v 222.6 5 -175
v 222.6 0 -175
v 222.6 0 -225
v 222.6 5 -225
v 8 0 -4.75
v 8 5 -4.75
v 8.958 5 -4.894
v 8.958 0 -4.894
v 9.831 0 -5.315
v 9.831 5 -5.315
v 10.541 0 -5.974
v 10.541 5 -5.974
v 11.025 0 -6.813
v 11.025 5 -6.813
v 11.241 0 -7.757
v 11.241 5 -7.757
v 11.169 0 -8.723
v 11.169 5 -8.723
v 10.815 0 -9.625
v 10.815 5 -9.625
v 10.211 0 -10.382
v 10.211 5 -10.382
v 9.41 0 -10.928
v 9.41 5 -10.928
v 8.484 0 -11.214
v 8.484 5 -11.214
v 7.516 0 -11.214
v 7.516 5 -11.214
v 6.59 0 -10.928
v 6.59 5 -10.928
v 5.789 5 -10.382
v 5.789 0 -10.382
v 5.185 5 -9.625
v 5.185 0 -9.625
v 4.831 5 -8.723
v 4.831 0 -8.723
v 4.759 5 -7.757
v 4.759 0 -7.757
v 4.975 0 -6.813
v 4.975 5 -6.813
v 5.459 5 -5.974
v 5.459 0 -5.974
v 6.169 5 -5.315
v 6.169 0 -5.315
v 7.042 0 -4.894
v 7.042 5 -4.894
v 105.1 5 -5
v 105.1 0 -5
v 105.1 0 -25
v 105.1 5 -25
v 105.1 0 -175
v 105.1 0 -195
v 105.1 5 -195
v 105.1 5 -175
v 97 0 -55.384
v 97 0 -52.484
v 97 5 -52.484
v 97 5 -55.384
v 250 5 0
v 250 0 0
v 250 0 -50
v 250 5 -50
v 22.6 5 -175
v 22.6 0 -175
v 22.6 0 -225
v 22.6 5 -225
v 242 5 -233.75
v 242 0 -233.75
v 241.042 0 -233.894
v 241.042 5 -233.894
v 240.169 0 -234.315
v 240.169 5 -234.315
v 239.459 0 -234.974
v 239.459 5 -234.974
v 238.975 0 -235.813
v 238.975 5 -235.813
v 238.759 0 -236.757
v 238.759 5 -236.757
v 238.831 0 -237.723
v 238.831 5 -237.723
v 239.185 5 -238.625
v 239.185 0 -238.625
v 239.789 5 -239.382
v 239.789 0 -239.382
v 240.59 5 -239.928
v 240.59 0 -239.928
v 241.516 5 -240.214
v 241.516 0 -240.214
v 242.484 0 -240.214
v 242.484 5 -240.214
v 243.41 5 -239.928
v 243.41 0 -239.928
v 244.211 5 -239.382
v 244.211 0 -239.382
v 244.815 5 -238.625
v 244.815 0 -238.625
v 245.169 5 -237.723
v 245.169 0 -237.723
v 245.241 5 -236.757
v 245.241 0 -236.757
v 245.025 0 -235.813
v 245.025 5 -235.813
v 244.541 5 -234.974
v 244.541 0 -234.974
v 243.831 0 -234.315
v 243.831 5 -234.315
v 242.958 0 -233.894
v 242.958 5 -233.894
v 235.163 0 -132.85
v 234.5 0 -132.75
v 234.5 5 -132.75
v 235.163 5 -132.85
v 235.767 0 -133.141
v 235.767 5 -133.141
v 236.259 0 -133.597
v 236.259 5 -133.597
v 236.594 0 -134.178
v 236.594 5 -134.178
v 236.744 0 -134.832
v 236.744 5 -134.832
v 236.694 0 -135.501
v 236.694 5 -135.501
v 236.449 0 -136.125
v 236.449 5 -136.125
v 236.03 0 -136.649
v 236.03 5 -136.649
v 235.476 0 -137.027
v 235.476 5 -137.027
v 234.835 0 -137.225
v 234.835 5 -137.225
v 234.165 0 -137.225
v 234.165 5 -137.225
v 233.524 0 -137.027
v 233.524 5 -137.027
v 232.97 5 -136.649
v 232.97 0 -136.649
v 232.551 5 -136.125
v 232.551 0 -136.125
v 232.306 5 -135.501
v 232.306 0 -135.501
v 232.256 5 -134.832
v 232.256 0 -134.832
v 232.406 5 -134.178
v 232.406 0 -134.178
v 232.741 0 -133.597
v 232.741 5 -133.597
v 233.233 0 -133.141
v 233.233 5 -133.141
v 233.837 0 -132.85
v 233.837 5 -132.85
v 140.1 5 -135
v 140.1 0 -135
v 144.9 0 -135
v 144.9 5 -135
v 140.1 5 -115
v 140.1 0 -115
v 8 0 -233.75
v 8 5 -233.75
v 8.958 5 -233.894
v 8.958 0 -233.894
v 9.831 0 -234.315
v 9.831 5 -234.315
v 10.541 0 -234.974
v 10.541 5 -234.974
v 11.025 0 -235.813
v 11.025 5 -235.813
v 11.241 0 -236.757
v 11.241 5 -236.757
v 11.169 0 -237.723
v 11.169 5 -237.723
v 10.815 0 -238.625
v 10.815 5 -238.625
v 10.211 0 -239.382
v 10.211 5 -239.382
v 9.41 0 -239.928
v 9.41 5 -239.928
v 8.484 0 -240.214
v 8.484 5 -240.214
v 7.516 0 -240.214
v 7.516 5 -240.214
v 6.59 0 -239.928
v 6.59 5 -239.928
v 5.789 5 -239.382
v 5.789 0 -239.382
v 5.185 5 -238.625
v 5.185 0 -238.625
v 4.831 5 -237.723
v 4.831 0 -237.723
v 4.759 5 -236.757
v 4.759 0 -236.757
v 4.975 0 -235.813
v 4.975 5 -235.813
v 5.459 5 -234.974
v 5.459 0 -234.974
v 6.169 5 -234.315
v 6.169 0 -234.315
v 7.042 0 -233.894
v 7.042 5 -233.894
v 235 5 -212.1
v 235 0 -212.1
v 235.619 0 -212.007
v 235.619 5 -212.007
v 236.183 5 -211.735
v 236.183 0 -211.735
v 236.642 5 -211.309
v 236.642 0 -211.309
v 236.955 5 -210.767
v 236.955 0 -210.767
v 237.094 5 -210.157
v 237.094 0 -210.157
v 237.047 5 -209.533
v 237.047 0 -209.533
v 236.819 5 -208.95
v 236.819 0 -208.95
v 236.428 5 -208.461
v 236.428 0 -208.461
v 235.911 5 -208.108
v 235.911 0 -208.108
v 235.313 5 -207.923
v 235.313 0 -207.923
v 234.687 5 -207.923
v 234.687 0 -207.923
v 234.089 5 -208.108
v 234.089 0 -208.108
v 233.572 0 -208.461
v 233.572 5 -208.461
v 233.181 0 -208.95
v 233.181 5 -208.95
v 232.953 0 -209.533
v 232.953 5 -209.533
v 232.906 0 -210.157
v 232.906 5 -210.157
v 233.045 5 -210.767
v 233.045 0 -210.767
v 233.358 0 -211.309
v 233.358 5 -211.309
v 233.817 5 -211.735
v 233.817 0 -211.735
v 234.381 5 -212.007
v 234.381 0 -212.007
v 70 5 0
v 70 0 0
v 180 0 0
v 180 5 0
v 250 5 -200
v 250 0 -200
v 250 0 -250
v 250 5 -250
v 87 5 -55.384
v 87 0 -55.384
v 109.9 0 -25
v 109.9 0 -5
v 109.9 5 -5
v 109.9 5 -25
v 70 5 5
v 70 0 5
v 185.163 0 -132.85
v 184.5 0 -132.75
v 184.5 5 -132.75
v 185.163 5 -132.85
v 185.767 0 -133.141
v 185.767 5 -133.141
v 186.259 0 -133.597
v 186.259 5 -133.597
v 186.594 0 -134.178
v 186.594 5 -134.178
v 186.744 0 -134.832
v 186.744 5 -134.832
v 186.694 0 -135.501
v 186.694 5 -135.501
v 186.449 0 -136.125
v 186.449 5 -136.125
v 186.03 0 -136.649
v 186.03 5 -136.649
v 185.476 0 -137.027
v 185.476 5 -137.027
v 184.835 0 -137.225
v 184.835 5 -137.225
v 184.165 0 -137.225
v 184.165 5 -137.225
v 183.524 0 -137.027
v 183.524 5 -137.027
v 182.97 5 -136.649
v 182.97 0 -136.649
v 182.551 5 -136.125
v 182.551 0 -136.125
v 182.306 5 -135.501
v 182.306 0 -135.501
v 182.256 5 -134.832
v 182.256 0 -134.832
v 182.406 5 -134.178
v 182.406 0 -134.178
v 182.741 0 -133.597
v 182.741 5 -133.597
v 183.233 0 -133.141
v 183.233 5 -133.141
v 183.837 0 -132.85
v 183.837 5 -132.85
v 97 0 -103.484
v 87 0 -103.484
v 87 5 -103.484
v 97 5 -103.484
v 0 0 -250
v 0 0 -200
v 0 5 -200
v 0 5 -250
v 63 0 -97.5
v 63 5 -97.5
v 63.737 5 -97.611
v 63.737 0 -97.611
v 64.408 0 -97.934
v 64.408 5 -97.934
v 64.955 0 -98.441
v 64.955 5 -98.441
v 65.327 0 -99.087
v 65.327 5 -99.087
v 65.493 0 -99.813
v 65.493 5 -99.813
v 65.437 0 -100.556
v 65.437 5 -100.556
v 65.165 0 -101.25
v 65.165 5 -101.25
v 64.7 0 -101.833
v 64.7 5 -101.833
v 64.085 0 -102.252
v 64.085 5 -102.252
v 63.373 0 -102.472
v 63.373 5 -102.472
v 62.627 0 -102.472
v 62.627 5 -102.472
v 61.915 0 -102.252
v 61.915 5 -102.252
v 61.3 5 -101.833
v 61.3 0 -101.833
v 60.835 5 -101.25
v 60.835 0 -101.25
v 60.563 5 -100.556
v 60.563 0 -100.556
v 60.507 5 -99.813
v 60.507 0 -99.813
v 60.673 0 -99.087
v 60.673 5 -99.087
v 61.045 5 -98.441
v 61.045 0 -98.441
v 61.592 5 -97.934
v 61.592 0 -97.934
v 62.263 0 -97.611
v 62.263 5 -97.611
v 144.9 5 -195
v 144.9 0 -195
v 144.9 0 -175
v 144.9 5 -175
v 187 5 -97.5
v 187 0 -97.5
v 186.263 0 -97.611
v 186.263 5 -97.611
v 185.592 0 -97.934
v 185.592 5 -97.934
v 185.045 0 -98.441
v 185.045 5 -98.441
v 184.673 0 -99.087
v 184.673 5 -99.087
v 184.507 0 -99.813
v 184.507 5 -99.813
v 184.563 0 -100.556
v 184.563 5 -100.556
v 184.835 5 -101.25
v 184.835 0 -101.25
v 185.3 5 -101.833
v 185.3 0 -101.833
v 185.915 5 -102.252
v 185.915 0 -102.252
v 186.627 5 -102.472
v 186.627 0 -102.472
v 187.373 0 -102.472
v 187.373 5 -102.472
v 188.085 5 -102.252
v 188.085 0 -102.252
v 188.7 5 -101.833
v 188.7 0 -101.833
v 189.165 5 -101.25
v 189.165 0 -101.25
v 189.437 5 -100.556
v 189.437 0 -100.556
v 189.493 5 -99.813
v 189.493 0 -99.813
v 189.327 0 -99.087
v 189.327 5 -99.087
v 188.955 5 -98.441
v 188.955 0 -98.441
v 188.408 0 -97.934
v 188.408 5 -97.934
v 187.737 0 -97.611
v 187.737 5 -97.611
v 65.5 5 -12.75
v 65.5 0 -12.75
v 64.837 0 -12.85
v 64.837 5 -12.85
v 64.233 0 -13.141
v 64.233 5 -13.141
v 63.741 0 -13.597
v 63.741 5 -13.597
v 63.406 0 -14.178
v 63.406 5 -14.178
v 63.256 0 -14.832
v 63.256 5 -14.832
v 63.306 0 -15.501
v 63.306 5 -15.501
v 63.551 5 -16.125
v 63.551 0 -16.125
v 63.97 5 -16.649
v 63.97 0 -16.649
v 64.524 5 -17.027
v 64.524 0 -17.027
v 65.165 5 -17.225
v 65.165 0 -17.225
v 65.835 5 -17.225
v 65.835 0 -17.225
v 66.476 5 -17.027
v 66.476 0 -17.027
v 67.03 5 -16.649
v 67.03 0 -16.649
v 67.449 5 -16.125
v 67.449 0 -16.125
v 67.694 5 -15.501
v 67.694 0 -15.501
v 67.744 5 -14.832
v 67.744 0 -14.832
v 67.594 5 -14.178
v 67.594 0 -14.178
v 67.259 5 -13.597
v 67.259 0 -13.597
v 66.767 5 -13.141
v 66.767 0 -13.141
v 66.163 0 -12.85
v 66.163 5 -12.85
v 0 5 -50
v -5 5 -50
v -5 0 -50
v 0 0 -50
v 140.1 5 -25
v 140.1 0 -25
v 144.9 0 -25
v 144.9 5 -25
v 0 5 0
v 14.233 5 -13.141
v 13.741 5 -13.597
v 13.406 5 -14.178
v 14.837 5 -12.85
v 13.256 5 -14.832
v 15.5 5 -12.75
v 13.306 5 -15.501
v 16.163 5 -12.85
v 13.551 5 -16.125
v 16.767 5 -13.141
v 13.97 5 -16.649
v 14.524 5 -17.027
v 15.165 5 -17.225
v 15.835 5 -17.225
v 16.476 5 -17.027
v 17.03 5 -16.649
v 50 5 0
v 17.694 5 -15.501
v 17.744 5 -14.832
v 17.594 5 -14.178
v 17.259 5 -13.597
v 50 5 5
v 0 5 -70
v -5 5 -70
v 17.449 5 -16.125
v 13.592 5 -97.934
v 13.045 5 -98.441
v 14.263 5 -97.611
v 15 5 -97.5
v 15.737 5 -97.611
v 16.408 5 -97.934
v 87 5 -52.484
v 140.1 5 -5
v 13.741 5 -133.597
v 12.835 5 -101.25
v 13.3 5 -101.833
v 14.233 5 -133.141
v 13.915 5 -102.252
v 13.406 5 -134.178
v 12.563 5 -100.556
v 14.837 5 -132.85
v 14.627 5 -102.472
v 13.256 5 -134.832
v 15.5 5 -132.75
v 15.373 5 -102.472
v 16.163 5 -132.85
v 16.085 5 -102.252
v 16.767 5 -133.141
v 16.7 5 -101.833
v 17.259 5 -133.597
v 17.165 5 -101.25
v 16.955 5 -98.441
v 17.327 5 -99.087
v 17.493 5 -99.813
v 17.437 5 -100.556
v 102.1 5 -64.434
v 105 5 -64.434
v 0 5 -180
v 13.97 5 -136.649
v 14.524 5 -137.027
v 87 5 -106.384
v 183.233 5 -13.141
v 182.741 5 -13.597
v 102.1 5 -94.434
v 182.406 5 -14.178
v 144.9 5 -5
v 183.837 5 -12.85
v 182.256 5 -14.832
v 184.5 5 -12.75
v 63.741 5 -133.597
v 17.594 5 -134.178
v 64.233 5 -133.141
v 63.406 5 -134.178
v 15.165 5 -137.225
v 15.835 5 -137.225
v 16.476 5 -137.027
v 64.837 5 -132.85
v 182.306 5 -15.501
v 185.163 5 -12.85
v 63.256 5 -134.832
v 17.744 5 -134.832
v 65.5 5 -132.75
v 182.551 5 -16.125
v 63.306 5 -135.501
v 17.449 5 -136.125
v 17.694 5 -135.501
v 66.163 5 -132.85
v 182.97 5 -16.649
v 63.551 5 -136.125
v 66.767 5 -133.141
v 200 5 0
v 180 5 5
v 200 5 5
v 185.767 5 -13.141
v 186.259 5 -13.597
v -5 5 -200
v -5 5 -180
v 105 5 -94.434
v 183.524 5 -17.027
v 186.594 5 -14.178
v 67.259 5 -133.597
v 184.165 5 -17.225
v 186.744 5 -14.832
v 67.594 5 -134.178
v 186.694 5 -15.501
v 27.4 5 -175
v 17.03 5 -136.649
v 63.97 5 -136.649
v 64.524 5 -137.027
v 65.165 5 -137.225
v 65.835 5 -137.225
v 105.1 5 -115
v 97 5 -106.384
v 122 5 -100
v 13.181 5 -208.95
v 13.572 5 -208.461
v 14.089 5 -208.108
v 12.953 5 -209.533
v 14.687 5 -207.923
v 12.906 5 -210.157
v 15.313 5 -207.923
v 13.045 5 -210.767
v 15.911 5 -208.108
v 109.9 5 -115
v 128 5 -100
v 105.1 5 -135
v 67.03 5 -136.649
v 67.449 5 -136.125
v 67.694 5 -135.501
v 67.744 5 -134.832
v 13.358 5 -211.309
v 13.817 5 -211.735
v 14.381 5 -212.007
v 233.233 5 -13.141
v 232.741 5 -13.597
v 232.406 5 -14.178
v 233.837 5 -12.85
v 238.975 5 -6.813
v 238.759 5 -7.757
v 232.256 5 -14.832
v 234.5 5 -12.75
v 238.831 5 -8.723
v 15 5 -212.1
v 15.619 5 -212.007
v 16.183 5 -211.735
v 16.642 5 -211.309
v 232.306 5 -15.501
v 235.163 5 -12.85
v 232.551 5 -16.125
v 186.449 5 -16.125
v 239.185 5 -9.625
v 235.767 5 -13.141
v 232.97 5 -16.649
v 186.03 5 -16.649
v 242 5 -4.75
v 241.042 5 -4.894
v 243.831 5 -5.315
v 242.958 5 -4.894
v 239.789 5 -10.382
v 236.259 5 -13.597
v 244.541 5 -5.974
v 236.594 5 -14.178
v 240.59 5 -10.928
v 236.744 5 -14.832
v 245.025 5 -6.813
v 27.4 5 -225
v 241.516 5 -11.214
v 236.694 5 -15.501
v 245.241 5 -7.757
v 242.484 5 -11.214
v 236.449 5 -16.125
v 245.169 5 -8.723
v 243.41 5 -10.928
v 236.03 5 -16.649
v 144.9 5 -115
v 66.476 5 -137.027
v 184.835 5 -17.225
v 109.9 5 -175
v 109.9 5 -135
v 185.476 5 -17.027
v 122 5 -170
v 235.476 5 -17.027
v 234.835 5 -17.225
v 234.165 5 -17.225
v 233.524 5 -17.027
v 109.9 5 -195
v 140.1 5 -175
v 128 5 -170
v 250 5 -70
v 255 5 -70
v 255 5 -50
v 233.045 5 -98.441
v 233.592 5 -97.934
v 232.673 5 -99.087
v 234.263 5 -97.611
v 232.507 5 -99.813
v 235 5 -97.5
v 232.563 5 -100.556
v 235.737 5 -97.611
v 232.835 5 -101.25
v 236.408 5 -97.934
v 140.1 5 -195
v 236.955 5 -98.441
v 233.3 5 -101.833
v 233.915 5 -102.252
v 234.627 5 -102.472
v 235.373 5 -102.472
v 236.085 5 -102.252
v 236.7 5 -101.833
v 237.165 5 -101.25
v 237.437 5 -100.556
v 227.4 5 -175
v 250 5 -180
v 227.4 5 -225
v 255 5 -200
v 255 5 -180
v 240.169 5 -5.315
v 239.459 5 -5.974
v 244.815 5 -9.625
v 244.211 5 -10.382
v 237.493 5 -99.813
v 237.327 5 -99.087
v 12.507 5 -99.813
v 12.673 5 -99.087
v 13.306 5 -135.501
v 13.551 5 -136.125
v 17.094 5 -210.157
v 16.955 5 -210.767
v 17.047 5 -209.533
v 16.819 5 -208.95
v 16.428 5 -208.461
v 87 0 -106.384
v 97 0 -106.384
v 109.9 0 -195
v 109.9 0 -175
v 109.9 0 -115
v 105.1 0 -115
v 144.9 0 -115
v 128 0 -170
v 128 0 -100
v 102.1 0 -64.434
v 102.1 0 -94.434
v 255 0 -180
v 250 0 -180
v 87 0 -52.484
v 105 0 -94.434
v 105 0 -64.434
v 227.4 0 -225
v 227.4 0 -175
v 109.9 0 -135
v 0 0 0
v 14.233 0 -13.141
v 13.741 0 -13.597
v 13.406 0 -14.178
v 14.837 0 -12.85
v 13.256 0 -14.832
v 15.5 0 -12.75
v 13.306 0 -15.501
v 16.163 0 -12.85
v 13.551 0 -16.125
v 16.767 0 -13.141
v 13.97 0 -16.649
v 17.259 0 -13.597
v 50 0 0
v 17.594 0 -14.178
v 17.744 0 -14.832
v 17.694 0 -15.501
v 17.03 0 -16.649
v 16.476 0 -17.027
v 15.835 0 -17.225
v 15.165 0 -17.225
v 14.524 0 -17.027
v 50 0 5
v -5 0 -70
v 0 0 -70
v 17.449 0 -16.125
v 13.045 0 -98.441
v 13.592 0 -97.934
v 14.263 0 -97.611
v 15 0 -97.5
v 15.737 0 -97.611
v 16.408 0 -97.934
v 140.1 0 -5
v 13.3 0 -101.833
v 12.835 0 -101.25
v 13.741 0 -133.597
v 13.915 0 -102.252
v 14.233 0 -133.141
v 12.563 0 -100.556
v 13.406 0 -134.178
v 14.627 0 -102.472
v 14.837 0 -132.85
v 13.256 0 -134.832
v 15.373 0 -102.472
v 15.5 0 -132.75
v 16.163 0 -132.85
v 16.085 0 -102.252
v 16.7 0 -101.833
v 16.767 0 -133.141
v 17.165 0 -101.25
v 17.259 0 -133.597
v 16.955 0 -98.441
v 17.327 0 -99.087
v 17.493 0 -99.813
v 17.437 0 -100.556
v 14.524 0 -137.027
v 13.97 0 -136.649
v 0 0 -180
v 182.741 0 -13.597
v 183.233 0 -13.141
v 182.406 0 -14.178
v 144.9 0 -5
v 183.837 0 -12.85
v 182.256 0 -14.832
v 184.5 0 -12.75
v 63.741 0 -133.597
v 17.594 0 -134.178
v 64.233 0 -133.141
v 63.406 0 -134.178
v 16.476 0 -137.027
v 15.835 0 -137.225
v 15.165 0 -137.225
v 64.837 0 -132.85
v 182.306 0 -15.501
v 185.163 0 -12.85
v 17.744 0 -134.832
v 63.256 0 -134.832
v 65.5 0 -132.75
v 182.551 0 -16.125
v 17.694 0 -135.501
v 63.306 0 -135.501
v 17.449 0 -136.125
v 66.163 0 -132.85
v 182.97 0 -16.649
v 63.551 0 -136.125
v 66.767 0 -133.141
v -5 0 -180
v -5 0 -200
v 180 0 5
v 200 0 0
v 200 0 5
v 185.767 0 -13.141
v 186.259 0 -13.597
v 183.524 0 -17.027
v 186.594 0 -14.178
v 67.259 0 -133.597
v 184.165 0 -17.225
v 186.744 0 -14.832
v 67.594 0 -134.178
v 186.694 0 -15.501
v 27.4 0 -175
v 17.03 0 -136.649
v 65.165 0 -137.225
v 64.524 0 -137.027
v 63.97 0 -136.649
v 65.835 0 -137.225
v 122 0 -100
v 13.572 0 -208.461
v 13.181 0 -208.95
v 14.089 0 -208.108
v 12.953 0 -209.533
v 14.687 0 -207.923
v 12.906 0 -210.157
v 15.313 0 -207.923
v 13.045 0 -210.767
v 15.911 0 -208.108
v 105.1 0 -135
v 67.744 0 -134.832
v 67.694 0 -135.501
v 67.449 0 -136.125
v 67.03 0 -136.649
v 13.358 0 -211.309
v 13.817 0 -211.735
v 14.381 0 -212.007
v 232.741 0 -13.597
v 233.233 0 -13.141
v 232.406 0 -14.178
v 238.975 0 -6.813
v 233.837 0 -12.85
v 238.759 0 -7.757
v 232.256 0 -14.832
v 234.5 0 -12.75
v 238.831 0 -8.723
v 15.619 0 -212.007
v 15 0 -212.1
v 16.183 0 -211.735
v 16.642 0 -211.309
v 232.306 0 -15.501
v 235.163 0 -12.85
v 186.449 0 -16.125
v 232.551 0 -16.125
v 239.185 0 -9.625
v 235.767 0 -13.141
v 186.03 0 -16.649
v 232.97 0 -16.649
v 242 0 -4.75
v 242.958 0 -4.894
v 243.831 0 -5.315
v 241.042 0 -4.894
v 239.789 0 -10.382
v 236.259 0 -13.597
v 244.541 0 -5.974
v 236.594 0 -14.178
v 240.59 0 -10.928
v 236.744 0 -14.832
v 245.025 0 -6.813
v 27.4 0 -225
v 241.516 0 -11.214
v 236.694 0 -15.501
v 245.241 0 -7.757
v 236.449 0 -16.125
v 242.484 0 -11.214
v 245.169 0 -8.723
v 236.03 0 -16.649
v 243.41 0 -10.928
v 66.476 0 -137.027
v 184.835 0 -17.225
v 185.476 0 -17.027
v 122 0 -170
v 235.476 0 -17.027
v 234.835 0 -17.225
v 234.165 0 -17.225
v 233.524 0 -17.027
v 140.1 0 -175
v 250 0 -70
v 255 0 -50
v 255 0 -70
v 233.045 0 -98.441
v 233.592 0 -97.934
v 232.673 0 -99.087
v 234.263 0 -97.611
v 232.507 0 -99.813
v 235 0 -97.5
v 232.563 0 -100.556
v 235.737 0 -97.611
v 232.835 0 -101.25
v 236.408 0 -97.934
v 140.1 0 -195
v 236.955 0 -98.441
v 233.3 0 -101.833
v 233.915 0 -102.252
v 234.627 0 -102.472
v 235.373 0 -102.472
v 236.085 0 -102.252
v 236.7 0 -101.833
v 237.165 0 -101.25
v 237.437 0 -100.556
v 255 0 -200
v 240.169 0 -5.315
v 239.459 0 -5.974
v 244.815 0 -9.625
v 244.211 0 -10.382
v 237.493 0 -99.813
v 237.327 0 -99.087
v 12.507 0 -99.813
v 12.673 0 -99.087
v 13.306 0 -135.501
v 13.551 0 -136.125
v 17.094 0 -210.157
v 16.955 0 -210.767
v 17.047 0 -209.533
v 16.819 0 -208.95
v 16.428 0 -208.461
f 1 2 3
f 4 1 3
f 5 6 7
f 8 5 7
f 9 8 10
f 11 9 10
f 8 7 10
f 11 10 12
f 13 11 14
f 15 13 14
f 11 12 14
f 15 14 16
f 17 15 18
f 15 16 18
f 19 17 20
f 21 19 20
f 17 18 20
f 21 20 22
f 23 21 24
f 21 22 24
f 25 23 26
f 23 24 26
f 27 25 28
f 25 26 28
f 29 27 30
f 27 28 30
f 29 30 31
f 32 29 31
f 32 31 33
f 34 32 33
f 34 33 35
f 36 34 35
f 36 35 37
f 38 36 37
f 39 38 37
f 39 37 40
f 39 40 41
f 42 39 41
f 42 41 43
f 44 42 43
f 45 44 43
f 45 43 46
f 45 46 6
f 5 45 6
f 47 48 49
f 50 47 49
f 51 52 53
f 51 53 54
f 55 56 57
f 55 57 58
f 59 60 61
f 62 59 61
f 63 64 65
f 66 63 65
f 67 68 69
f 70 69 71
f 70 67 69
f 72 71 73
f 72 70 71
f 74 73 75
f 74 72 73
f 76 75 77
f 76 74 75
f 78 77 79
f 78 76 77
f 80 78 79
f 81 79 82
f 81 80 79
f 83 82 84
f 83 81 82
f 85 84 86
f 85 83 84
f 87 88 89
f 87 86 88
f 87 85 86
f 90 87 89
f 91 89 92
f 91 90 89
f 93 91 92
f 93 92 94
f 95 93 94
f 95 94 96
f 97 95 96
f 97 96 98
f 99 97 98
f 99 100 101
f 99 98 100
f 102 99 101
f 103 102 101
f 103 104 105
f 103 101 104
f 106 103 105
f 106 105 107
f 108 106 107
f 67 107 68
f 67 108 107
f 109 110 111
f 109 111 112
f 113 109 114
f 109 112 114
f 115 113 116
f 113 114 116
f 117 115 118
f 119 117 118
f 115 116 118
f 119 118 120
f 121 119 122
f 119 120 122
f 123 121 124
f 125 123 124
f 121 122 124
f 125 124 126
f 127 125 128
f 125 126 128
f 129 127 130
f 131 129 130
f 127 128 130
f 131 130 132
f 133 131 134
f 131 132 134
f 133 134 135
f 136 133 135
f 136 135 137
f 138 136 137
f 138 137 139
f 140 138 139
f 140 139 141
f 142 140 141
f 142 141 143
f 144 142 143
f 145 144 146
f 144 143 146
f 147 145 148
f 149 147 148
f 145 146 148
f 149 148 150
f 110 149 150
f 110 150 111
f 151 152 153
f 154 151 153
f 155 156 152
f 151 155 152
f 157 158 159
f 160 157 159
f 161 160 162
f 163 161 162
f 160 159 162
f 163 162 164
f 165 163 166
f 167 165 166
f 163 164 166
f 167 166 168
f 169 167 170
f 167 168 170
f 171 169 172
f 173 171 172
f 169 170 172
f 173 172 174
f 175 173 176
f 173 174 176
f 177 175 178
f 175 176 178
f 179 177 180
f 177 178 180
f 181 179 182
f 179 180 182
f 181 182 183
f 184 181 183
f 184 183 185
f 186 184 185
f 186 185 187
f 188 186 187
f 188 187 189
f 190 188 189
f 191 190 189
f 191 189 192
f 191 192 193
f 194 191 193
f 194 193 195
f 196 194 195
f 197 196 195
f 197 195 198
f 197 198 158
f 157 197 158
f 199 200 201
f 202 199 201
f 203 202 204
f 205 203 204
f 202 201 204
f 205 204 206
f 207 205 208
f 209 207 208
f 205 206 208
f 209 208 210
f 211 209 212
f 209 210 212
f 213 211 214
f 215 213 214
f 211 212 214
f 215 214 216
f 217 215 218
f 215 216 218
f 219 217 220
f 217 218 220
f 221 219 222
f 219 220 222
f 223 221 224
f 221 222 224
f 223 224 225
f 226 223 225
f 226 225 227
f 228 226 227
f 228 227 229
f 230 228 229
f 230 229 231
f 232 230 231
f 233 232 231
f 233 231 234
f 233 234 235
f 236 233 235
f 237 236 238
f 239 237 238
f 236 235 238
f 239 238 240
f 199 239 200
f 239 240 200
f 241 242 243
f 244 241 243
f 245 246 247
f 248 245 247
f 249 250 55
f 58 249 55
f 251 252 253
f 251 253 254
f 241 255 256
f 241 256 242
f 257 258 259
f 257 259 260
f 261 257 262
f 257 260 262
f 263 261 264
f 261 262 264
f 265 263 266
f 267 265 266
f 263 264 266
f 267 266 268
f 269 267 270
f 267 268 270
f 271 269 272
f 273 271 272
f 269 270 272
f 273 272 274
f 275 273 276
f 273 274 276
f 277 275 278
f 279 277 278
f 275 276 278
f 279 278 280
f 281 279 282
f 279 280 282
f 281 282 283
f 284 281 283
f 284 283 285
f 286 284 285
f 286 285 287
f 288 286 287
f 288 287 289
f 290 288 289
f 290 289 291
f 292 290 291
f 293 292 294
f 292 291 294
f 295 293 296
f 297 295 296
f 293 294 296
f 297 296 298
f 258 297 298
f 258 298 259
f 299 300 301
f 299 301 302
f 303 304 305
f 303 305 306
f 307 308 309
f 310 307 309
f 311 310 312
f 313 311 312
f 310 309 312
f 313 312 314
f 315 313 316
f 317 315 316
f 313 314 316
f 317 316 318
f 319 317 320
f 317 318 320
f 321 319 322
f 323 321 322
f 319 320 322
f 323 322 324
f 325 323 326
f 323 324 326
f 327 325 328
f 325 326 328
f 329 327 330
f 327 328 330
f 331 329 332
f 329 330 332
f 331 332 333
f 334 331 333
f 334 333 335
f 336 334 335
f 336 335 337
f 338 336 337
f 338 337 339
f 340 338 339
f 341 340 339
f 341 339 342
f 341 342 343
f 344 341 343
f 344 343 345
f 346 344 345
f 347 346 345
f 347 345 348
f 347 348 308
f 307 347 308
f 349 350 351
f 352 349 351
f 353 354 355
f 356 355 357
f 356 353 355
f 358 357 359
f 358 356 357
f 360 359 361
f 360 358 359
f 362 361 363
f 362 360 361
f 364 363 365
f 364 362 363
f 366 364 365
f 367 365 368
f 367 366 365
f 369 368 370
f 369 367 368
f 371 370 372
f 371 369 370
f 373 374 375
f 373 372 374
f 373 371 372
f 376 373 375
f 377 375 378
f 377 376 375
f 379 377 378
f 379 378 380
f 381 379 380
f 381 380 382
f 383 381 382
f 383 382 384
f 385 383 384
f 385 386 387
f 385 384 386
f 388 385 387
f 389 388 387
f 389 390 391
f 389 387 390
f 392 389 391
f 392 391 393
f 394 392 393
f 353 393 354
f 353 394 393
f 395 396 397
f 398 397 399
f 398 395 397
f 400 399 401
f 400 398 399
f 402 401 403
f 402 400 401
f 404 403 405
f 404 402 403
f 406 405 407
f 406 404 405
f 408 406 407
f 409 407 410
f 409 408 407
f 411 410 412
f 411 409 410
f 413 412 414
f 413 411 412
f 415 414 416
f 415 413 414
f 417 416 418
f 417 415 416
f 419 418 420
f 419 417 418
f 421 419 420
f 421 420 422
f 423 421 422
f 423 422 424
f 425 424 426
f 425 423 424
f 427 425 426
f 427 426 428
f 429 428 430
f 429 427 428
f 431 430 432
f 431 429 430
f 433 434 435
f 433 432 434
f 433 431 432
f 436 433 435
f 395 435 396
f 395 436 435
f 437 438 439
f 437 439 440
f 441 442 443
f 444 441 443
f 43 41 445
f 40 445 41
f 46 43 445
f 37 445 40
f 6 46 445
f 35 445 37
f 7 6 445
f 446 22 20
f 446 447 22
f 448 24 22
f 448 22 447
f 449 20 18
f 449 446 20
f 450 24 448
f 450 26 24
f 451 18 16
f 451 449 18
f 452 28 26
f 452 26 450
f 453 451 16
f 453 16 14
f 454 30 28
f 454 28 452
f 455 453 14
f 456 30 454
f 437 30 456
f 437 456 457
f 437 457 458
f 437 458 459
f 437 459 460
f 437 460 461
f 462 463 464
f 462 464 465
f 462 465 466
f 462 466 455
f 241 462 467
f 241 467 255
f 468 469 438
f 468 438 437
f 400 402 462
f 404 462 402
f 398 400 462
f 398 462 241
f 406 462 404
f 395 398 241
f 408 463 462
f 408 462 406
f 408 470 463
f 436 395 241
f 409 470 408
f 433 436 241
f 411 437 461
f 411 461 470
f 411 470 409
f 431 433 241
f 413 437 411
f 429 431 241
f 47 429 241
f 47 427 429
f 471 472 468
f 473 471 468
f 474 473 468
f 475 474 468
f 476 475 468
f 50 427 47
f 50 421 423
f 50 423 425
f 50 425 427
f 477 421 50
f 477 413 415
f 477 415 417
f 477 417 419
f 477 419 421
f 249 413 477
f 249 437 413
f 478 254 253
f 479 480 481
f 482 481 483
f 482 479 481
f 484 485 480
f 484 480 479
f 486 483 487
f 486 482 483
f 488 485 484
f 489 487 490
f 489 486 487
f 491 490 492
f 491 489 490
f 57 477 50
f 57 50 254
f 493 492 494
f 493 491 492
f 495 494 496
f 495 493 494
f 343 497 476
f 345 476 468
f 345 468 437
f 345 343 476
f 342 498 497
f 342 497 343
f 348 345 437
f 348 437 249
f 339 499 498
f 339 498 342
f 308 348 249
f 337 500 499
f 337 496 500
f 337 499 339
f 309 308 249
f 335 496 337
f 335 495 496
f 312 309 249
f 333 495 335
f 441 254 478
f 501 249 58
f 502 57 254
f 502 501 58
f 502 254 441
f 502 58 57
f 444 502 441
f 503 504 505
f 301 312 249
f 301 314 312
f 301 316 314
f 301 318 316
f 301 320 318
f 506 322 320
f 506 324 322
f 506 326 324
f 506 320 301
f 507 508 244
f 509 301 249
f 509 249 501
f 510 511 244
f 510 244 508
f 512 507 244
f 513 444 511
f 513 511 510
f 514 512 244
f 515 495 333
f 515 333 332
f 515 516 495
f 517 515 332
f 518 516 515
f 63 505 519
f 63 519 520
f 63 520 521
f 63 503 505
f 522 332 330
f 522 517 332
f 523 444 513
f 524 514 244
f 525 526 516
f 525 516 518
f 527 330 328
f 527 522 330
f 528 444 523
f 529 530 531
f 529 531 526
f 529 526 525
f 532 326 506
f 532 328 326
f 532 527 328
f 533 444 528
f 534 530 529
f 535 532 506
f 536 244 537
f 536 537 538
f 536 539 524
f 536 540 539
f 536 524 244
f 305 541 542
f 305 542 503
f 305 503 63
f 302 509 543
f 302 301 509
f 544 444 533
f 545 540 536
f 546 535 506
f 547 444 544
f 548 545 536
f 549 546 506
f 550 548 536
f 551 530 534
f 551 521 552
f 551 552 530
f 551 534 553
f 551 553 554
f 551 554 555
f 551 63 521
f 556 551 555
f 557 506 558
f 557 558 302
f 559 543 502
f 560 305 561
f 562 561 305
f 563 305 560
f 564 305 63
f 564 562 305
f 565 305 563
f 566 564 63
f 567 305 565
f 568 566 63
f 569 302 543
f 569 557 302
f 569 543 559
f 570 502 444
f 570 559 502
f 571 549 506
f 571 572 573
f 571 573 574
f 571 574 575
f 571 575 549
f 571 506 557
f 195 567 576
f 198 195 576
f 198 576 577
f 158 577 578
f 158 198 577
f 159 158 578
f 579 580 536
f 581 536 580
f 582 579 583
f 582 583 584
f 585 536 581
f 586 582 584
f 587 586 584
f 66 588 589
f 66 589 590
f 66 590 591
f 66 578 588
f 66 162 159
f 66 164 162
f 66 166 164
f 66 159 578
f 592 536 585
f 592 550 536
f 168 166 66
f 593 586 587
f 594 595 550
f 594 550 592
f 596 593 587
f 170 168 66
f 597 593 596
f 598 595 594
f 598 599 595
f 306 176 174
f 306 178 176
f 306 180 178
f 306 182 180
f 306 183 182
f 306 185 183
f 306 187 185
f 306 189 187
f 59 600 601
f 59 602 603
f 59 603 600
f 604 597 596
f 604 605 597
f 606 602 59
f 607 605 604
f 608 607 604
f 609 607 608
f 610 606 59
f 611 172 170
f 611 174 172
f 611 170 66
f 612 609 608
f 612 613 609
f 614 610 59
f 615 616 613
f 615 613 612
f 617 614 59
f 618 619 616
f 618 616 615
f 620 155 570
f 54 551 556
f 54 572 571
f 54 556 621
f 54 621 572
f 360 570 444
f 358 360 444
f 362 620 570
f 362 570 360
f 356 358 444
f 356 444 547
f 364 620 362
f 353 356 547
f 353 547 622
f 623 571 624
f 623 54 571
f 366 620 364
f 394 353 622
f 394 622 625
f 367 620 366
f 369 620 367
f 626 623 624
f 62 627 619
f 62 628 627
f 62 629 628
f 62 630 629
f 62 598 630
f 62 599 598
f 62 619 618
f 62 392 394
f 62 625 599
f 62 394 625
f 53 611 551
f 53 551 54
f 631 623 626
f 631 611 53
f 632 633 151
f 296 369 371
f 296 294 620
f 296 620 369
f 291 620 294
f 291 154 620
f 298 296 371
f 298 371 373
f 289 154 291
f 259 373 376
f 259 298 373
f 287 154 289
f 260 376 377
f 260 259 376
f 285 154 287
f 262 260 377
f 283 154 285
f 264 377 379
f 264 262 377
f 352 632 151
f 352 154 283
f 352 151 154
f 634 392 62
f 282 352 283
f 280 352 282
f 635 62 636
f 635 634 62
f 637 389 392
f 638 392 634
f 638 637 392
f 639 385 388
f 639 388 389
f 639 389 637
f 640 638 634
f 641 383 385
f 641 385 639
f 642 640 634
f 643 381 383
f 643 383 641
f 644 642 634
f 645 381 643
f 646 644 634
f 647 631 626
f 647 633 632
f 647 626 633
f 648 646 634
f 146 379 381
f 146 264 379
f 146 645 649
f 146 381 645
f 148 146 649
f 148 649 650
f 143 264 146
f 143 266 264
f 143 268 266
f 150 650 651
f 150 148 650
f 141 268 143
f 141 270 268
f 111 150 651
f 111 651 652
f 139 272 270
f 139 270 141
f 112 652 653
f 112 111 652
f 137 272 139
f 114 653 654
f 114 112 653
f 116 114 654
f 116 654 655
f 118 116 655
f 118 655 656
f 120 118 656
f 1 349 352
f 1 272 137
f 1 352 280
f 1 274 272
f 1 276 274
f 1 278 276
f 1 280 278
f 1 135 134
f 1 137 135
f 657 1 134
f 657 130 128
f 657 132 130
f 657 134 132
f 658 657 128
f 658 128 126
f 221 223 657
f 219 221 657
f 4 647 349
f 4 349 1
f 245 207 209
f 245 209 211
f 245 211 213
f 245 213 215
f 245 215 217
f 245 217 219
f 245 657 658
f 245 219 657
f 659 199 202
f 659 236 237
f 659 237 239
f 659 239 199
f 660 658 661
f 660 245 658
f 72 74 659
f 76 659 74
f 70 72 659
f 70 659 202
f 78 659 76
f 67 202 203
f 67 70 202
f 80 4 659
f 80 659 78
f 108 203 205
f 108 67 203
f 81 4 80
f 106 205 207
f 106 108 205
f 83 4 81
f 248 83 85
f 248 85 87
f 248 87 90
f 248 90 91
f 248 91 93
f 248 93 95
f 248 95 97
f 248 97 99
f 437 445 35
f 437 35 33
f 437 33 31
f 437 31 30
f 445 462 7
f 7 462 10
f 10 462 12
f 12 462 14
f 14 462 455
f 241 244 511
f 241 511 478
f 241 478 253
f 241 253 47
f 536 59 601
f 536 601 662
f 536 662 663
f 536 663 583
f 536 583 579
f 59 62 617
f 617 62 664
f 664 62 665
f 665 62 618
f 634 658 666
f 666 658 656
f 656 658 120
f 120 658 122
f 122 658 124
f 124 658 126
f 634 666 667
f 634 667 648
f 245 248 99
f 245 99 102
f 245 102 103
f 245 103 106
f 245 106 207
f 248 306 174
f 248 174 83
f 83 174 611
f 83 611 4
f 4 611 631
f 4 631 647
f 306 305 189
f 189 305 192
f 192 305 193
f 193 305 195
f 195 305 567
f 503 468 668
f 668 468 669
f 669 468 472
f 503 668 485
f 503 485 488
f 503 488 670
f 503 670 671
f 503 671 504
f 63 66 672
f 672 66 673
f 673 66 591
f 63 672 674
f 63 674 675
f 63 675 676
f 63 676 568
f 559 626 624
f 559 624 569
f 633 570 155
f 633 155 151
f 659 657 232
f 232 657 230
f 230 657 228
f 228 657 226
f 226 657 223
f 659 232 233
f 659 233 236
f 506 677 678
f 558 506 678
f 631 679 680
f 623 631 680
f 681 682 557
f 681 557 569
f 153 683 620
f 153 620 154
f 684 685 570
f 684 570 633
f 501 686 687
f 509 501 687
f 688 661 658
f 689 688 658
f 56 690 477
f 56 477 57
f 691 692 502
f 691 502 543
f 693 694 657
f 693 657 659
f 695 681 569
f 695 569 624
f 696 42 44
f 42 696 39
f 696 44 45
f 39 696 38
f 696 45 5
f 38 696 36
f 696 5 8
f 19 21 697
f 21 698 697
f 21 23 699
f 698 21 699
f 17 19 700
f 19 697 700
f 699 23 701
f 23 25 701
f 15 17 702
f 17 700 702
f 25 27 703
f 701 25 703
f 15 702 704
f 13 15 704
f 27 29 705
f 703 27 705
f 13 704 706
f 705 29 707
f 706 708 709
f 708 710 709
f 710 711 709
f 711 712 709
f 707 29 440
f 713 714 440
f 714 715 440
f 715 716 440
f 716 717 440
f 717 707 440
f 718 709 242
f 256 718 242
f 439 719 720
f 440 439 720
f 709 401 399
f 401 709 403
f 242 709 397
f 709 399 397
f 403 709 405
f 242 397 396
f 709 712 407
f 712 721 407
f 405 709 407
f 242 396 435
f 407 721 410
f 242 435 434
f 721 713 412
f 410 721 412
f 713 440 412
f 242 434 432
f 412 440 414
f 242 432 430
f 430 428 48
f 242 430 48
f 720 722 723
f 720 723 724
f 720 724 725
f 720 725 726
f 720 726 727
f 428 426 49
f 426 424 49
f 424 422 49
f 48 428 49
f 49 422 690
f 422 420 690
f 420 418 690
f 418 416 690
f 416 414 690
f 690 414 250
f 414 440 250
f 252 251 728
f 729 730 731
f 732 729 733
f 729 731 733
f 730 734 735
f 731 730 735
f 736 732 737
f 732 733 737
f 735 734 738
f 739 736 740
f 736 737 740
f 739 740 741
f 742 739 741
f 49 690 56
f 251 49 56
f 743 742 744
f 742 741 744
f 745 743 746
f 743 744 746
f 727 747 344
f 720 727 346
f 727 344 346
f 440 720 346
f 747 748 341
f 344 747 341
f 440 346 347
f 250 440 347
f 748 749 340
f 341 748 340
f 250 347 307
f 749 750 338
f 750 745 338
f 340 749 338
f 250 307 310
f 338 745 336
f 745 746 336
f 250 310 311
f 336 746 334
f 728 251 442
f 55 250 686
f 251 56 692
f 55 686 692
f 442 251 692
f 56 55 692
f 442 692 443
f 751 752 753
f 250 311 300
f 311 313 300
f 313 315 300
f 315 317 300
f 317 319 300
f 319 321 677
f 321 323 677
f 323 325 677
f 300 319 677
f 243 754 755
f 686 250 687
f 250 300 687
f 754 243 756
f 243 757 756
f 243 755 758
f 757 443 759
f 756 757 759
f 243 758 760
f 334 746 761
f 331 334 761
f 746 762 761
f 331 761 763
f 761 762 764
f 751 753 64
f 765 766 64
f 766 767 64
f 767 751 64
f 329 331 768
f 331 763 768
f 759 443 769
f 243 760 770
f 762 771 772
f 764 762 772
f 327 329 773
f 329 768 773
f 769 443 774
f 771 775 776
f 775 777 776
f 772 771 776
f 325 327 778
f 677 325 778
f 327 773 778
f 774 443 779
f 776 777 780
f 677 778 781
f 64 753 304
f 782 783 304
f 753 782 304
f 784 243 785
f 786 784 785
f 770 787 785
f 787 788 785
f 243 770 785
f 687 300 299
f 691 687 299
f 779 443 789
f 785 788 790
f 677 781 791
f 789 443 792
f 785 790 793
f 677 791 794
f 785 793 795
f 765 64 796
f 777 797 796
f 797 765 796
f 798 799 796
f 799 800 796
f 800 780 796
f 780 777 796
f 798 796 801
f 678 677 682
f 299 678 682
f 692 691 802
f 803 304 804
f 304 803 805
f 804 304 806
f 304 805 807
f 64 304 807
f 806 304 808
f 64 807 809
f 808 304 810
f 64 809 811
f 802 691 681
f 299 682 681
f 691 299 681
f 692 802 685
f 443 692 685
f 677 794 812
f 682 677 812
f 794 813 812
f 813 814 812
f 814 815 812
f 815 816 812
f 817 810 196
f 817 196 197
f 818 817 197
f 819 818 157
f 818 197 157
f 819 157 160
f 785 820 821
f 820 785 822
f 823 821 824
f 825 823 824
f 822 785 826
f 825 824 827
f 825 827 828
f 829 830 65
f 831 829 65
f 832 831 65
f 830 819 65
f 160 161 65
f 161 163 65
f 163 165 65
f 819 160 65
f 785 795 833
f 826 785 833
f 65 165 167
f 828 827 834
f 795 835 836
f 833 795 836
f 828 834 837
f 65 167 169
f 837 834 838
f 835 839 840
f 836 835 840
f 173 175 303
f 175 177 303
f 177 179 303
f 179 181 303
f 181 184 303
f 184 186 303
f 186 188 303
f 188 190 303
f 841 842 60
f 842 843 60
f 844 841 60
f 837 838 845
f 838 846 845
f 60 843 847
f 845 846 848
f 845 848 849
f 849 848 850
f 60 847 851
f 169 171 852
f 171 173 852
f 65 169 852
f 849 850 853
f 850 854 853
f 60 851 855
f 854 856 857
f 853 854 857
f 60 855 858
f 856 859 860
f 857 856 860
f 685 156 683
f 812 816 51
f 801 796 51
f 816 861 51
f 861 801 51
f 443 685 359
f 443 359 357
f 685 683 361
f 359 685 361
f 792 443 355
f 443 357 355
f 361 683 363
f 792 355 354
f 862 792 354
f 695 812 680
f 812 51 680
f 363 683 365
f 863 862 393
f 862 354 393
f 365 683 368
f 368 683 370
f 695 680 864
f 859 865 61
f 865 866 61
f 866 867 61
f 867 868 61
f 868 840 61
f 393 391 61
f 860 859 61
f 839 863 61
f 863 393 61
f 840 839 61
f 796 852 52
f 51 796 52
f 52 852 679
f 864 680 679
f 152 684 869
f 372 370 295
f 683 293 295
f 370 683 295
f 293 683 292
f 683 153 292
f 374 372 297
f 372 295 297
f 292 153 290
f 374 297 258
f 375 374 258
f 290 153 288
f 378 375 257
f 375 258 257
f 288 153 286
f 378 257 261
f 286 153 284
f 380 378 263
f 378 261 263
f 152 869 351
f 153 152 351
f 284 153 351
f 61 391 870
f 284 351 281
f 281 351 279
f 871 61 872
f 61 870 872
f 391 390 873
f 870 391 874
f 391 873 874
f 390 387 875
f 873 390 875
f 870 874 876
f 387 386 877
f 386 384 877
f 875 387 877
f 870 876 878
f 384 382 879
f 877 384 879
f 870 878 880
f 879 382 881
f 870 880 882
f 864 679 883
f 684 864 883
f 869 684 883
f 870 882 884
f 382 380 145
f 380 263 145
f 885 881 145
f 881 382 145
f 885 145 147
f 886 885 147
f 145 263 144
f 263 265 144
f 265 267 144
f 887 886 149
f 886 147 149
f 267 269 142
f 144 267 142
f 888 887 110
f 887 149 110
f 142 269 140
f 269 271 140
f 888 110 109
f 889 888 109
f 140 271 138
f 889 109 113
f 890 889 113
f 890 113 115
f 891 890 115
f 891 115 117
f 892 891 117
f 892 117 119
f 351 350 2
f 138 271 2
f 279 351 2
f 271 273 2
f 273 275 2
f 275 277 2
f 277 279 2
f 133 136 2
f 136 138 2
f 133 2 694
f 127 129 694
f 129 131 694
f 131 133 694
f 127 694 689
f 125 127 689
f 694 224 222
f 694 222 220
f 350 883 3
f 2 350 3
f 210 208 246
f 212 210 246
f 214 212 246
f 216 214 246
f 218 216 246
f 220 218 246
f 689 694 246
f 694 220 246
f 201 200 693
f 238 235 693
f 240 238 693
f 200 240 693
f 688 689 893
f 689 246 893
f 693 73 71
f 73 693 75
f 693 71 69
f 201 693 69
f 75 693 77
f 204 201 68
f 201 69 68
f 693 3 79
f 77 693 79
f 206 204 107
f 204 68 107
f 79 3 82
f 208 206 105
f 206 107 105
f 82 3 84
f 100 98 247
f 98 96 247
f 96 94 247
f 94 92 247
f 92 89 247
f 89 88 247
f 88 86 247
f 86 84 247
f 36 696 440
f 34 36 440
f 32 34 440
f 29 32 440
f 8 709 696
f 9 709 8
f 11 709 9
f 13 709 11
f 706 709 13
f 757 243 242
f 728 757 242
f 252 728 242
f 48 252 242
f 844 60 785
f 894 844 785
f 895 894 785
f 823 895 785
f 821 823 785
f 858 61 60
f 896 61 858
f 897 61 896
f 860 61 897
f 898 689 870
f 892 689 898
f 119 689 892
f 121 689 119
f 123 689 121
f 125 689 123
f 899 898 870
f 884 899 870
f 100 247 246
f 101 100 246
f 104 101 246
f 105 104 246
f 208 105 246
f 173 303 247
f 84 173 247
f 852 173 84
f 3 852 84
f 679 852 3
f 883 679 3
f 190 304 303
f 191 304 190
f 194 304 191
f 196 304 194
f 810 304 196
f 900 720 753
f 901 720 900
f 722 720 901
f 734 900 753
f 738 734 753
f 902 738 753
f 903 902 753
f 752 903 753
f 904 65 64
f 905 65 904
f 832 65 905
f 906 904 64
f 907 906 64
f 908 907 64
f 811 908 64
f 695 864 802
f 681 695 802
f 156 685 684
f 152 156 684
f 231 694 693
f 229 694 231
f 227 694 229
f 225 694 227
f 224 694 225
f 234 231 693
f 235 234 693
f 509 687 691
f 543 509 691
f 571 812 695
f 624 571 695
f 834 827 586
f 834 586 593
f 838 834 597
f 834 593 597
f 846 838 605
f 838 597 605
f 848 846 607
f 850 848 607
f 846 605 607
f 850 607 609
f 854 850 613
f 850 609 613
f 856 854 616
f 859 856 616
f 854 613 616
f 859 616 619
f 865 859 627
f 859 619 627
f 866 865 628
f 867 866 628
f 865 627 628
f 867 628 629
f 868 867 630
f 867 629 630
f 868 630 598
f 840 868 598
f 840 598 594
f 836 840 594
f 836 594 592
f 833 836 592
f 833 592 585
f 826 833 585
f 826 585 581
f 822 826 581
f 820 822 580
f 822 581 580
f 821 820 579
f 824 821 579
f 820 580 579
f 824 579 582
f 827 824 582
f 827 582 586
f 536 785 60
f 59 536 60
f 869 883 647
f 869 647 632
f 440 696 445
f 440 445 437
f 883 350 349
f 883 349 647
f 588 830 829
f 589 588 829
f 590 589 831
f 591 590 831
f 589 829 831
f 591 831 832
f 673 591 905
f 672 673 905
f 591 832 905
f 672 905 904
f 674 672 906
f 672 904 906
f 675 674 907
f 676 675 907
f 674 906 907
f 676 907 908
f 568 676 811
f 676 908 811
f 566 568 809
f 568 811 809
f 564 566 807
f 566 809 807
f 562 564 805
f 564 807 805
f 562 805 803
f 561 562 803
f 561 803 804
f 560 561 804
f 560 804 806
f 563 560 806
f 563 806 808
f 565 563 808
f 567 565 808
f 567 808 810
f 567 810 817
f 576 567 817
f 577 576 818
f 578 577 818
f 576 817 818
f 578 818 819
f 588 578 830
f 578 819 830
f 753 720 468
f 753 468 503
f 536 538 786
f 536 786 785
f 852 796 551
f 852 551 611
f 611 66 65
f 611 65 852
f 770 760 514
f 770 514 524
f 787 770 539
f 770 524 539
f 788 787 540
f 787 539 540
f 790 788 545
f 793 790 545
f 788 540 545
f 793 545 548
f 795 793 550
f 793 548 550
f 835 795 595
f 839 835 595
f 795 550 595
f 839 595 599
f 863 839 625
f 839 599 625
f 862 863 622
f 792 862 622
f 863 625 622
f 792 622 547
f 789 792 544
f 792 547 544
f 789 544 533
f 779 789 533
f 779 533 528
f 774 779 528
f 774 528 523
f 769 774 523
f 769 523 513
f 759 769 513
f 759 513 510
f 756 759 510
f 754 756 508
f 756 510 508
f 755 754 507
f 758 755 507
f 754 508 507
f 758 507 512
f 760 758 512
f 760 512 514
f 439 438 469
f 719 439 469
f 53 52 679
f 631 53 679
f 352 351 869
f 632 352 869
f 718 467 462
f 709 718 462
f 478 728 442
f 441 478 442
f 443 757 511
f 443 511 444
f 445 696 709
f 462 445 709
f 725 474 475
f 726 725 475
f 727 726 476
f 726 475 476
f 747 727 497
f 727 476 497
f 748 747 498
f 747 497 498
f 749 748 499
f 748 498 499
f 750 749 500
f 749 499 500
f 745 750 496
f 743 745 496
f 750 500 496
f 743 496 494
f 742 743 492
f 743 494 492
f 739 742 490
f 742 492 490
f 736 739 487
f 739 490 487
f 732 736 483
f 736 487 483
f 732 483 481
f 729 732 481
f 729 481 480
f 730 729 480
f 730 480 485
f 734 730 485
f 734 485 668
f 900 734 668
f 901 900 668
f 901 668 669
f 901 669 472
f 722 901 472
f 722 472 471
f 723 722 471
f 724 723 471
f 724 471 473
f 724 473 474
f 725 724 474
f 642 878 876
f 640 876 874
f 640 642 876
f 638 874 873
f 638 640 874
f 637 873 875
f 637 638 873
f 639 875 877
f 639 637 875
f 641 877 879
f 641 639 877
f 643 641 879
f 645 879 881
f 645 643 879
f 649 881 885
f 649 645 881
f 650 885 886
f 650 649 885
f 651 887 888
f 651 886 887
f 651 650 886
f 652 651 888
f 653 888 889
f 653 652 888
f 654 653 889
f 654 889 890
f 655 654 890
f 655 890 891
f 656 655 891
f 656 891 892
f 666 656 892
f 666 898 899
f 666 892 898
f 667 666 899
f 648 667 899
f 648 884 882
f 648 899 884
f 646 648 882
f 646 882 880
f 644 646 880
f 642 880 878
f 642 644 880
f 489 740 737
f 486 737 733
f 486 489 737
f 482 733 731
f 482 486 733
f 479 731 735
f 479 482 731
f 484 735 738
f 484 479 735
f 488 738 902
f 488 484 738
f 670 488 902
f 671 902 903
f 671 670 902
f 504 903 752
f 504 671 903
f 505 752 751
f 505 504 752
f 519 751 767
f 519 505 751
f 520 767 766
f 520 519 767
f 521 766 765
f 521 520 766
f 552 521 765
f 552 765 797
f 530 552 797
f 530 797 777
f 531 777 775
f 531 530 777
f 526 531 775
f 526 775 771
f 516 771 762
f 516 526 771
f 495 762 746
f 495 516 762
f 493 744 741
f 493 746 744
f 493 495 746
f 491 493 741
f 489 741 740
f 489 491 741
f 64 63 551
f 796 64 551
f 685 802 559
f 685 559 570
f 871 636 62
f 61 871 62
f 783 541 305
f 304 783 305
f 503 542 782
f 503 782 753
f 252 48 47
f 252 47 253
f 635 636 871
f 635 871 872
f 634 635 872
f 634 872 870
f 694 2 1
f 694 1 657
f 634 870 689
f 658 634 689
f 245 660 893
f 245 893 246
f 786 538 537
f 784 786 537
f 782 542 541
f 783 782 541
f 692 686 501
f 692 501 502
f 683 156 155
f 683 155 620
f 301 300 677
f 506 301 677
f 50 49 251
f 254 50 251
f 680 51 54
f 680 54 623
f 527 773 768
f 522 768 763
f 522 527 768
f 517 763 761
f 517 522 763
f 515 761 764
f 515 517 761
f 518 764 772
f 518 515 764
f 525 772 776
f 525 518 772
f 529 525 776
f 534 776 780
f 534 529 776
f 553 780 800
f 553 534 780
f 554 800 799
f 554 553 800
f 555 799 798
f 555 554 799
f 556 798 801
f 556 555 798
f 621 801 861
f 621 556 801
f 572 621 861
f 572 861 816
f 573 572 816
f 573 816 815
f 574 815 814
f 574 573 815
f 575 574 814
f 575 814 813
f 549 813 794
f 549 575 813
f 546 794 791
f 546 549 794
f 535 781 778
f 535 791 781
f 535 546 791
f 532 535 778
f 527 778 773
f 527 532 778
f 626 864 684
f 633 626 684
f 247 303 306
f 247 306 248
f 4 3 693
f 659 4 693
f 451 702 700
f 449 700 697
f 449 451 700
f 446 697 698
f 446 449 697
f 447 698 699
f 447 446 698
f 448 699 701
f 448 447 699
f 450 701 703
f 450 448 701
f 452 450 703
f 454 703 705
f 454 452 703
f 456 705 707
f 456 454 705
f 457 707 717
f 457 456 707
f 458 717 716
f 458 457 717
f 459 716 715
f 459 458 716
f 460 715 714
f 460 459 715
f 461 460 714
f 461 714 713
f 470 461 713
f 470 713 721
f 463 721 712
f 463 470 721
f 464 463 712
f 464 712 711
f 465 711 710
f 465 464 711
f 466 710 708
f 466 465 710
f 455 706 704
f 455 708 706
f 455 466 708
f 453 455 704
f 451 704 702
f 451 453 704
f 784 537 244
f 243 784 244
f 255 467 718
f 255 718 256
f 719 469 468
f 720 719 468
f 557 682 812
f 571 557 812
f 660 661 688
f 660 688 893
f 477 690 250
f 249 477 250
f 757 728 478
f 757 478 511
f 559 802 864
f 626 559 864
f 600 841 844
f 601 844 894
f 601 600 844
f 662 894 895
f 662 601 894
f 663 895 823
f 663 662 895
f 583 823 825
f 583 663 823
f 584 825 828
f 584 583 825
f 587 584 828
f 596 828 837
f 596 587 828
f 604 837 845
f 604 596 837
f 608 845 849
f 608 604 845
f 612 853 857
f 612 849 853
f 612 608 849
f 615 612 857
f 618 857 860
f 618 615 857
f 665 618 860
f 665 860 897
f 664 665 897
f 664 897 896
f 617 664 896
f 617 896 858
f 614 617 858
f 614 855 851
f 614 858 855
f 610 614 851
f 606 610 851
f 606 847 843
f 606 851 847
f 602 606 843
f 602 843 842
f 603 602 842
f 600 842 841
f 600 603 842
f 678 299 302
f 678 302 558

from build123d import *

# Parameters (mm, degrees)
SKETCH1_W                           = 250
SKETCH1_H                           = 250
SKETCH1_W_2                         = 4.8
SKETCH1_H_2                         = 20
SKETCH1_W_3                         = 10
SKETCH1_H_3                         = 2.9
SKETCH1_W_4                         = 2.9
SKETCH1_H_4                         = 30
SKETCH1_H_5                         = 50
SKETCH1_W_5                         = 6
SKETCH1_H_6                         = 70
BOSS_EXTRUDE1_DEPTH                 = 5
SKETCH2_R                           = 2.5
CUT_EXTRUDE1_DEPTH                  = 354.588744165
SKETCH3_R                           = 3.25
CUT_EXTRUDE2_DEPTH                  = 354.588744165
SKETCH4_W                           = 5
SKETCH4_H                           = 20
SKETCH4_W_2                         = 20
SKETCH4_H_2                         = 5
BOSS_EXTRUDE2_DEPTH                 = 5
F_4_5_4_5_DIAMETER_HOLE1_AT_2_COUNT = 2
F_4_5_4_5_DIAMETER_HOLE1_AT_2_PITCH = 50
F_4_5_4_5_DIAMETER_HOLE1_AT_3_COUNT = 2
F_4_5_4_5_DIAMETER_HOLE1_AT_3_PITCH = 130
F_4_5_4_5_DIAMETER_HOLE1_AT_4_COUNT = 2
F_4_5_4_5_DIAMETER_HOLE1_AT_4_PITCH = 120
SKETCH9_W                           = 4.8
SKETCH9_H                           = 20
CUT_EXTRUDE3_DEPTH                  = 358.141428569
SKETCH10_R                          = 2.1
CUT_EXTRUDE4_DEPTH                  = 5


with BuildPart() as part:
    # Sketch1 → Boss-Extrude1 (new body)
    with BuildSketch(Plane(origin=(0, 0, 0), x_dir=(1, 0, 0), z_dir=(0, 1, 0))):
        with Locations((125, 125)):
            Rectangle(SKETCH1_W, SKETCH1_H)
        with Locations((142.5, 15)):
            Rectangle(SKETCH1_W_2, SKETCH1_H_2, mode=Mode.SUBTRACT)
        with Locations((107.5, 15)):
            Rectangle(SKETCH1_W_2, SKETCH1_H_2, mode=Mode.SUBTRACT)
        with Locations((92, 53.93422616)):
            Rectangle(SKETCH1_W_3, SKETCH1_H_3, mode=Mode.SUBTRACT)
        with Locations((103.55, 79.434226159)):
            Rectangle(SKETCH1_W_4, SKETCH1_H_4, mode=Mode.SUBTRACT)
        with Locations((92, 104.93422616)):
            Rectangle(SKETCH1_W_3, SKETCH1_H_3, mode=Mode.SUBTRACT)
        with Locations((107.5, 125)):
            Rectangle(SKETCH1_W_2, SKETCH1_H_2, mode=Mode.SUBTRACT)
        with Locations((142.5, 125)):
            Rectangle(SKETCH1_W_2, SKETCH1_H_2, mode=Mode.SUBTRACT)
        with Locations((225, 200)):
            Rectangle(SKETCH1_W_2, SKETCH1_H_5, mode=Mode.SUBTRACT)
        with Locations((125, 135)):
            Rectangle(SKETCH1_W_5, SKETCH1_H_6, mode=Mode.SUBTRACT)
        with Locations((25, 200)):
            Rectangle(SKETCH1_W_2, SKETCH1_H_5, mode=Mode.SUBTRACT)
    extrude(amount=BOSS_EXTRUDE1_DEPTH)

    # Sketch2 → Cut-Extrude1 (cut, through all)
    with BuildSketch(Plane(origin=(0, 5, 0), x_dir=(1, 0, 0), z_dir=(0, 1, 0))):
        with Locations(Location((15, 100, 0), (0, 0, 270))):
            Circle(SKETCH2_R)
        with Locations(Location((63, 100, 0), (0, 0, 270))):
            Circle(SKETCH2_R)
    cut_extrude1 = extrude(amount=-CUT_EXTRUDE1_DEPTH, mode=Mode.SUBTRACT)

    # Sketch3 → Cut-Extrude2 (cut, through all)
    with BuildSketch(Plane(origin=(0, 5, 0), x_dir=(1, 0, 0), z_dir=(0, 1, 0))):
        with Locations(Location((8, 8, 0), (0, 0, 270))):
            Circle(SKETCH3_R)
        with Locations(Location((8, 237, 0), (0, 0, 270))):
            Circle(SKETCH3_R)
    cut_extrude2 = extrude(amount=-CUT_EXTRUDE2_DEPTH, mode=Mode.SUBTRACT)

    # Mirror1: Cut-Extrude2 across plane
    add(cut_extrude2.mirror(Plane.ZY.offset(-125)), mode=Mode.SUBTRACT)

    # Sketch4 → Boss-Extrude2 (add)
    with BuildSketch(Plane(origin=(0, 5, 0), x_dir=(1, 0, 0), z_dir=(0, 1, 0))):
        with Locations((-2.5, 190)):
            Rectangle(SKETCH4_W, SKETCH4_H)
        with Locations((-2.5, 60)):
            Rectangle(SKETCH4_W, SKETCH4_H)
        with Locations((60, -2.5)):
            Rectangle(SKETCH4_W_2, SKETCH4_H_2)
    boss_extrude2 = extrude(amount=-BOSS_EXTRUDE2_DEPTH)

    # Mirror2: Boss-Extrude2 across plane
    add(boss_extrude2.mirror(Plane.ZY.offset(-125)))

    # Mirror3: Cut-Extrude1 across plane
    add(cut_extrude1.mirror(Plane.ZY.offset(-125)), mode=Mode.SUBTRACT)

    # Sketch6 → Ø4.5 (4.5) Diameter Hole1 (revolve, cut)
    with BuildSketch(Plane(origin=(15.5, 5, -135), x_dir=(0, 0, 1), z_dir=(1, 0, 0))):
        Polygon((0, 0), (0, 11.351936393), (2.25, 10), (2.25, 0), align=None)
    f_4_5_4_5_diameter_hole1 = revolve(axis=Axis((15.5, 11.35, -135), (0, -1, 0)), mode=Mode.SUBTRACT)

    # Ø4.5 (4.5) Diameter Hole1 at 2: Ø4.5 (4.5) Diameter Hole1 ×2
    with Locations(*[(i * F_4_5_4_5_DIAMETER_HOLE1_AT_2_PITCH, 0, 0) for i in range(1, F_4_5_4_5_DIAMETER_HOLE1_AT_2_COUNT)]):
        add(f_4_5_4_5_diameter_hole1, mode=Mode.SUBTRACT)

    # Ø4.5 (4.5) Diameter Hole1 at 3: Ø4.5 (4.5) Diameter Hole1 ×2
    with Locations(*[Vector(0.38461538461538475, 0, 0.9230769230769231) * (i * F_4_5_4_5_DIAMETER_HOLE1_AT_3_PITCH) for i in range(1, F_4_5_4_5_DIAMETER_HOLE1_AT_3_COUNT)]):
        add(f_4_5_4_5_diameter_hole1, mode=Mode.SUBTRACT)

    # Ø4.5 (4.5) Diameter Hole1 at 4: Ø4.5 (4.5) Diameter Hole1 ×2
    with Locations(*[(0, 0, i * F_4_5_4_5_DIAMETER_HOLE1_AT_4_PITCH) for i in range(1, F_4_5_4_5_DIAMETER_HOLE1_AT_4_COUNT)]):
        add(f_4_5_4_5_diameter_hole1, mode=Mode.SUBTRACT)

    # Mirror4: Ø4.5 (4.5) Diameter Hole1 across plane
    add(f_4_5_4_5_diameter_hole1.mirror(Plane.ZY.offset(-125)), mode=Mode.SUBTRACT)

    # Mirror4 copy 1 sketch → Mirror4 copy 1 (revolve, cut)
    with BuildSketch(Plane(origin=(184.5, 5, -135), x_dir=(0, 0, 1), z_dir=(-1, 0, 0))):
        Polygon((0, 0), (0, -11.351936393), (2.25, -10), (2.25, 0), align=None)
    revolve(axis=Axis((184.5, 11.35, -135), (0, 1, 0)), mode=Mode.SUBTRACT)

    # Mirror4 copy 2 sketch → Mirror4 copy 2 (revolve, cut)
    with BuildSketch(Plane(origin=(184.5, 5, -15), x_dir=(0, 0, 1), z_dir=(-1, 0, 0))):
        Polygon((0, 0), (0, -11.351936393), (2.25, -10), (2.25, 0), align=None)
    revolve(axis=Axis((184.5, 11.35, -15), (0, 1, 0)), mode=Mode.SUBTRACT)

    # Mirror4 copy 3 sketch → Mirror4 copy 3 (revolve, cut)
    with BuildSketch(Plane(origin=(234.5, 5, -15), x_dir=(0, 0, 1), z_dir=(-1, 0, 0))):
        Polygon((0, 0), (0, -11.351936393), (2.25, -10), (2.25, 0), align=None)
    revolve(axis=Axis((234.5, 11.35, -15), (0, 1, 0)), mode=Mode.SUBTRACT)

    # Sketch9 → Cut-Extrude3 (cut, through all)
    with BuildSketch(Plane.XZ):
        with Locations((107.5, -185)):
            Rectangle(SKETCH9_W, SKETCH9_H)
    cut_extrude3 = extrude(amount=-CUT_EXTRUDE3_DEPTH, mode=Mode.SUBTRACT)

    # Mirror5: Cut-Extrude3 across plane
    add(cut_extrude3.mirror(Plane.ZY.offset(-125)), mode=Mode.SUBTRACT)

    # Sketch10 → Cut-Extrude4 (cut)
    with BuildSketch(Plane.XZ):
        with Locations(Location((15, -210, 0), (0, 0, 270))):
            Circle(SKETCH10_R)
        with Locations(Location((235, -210, 0), (0, 0, 270))):
            Circle(SKETCH10_R)
    extrude(amount=-CUT_EXTRUDE4_DEPTH, mode=Mode.SUBTRACT)


solid = part.part
